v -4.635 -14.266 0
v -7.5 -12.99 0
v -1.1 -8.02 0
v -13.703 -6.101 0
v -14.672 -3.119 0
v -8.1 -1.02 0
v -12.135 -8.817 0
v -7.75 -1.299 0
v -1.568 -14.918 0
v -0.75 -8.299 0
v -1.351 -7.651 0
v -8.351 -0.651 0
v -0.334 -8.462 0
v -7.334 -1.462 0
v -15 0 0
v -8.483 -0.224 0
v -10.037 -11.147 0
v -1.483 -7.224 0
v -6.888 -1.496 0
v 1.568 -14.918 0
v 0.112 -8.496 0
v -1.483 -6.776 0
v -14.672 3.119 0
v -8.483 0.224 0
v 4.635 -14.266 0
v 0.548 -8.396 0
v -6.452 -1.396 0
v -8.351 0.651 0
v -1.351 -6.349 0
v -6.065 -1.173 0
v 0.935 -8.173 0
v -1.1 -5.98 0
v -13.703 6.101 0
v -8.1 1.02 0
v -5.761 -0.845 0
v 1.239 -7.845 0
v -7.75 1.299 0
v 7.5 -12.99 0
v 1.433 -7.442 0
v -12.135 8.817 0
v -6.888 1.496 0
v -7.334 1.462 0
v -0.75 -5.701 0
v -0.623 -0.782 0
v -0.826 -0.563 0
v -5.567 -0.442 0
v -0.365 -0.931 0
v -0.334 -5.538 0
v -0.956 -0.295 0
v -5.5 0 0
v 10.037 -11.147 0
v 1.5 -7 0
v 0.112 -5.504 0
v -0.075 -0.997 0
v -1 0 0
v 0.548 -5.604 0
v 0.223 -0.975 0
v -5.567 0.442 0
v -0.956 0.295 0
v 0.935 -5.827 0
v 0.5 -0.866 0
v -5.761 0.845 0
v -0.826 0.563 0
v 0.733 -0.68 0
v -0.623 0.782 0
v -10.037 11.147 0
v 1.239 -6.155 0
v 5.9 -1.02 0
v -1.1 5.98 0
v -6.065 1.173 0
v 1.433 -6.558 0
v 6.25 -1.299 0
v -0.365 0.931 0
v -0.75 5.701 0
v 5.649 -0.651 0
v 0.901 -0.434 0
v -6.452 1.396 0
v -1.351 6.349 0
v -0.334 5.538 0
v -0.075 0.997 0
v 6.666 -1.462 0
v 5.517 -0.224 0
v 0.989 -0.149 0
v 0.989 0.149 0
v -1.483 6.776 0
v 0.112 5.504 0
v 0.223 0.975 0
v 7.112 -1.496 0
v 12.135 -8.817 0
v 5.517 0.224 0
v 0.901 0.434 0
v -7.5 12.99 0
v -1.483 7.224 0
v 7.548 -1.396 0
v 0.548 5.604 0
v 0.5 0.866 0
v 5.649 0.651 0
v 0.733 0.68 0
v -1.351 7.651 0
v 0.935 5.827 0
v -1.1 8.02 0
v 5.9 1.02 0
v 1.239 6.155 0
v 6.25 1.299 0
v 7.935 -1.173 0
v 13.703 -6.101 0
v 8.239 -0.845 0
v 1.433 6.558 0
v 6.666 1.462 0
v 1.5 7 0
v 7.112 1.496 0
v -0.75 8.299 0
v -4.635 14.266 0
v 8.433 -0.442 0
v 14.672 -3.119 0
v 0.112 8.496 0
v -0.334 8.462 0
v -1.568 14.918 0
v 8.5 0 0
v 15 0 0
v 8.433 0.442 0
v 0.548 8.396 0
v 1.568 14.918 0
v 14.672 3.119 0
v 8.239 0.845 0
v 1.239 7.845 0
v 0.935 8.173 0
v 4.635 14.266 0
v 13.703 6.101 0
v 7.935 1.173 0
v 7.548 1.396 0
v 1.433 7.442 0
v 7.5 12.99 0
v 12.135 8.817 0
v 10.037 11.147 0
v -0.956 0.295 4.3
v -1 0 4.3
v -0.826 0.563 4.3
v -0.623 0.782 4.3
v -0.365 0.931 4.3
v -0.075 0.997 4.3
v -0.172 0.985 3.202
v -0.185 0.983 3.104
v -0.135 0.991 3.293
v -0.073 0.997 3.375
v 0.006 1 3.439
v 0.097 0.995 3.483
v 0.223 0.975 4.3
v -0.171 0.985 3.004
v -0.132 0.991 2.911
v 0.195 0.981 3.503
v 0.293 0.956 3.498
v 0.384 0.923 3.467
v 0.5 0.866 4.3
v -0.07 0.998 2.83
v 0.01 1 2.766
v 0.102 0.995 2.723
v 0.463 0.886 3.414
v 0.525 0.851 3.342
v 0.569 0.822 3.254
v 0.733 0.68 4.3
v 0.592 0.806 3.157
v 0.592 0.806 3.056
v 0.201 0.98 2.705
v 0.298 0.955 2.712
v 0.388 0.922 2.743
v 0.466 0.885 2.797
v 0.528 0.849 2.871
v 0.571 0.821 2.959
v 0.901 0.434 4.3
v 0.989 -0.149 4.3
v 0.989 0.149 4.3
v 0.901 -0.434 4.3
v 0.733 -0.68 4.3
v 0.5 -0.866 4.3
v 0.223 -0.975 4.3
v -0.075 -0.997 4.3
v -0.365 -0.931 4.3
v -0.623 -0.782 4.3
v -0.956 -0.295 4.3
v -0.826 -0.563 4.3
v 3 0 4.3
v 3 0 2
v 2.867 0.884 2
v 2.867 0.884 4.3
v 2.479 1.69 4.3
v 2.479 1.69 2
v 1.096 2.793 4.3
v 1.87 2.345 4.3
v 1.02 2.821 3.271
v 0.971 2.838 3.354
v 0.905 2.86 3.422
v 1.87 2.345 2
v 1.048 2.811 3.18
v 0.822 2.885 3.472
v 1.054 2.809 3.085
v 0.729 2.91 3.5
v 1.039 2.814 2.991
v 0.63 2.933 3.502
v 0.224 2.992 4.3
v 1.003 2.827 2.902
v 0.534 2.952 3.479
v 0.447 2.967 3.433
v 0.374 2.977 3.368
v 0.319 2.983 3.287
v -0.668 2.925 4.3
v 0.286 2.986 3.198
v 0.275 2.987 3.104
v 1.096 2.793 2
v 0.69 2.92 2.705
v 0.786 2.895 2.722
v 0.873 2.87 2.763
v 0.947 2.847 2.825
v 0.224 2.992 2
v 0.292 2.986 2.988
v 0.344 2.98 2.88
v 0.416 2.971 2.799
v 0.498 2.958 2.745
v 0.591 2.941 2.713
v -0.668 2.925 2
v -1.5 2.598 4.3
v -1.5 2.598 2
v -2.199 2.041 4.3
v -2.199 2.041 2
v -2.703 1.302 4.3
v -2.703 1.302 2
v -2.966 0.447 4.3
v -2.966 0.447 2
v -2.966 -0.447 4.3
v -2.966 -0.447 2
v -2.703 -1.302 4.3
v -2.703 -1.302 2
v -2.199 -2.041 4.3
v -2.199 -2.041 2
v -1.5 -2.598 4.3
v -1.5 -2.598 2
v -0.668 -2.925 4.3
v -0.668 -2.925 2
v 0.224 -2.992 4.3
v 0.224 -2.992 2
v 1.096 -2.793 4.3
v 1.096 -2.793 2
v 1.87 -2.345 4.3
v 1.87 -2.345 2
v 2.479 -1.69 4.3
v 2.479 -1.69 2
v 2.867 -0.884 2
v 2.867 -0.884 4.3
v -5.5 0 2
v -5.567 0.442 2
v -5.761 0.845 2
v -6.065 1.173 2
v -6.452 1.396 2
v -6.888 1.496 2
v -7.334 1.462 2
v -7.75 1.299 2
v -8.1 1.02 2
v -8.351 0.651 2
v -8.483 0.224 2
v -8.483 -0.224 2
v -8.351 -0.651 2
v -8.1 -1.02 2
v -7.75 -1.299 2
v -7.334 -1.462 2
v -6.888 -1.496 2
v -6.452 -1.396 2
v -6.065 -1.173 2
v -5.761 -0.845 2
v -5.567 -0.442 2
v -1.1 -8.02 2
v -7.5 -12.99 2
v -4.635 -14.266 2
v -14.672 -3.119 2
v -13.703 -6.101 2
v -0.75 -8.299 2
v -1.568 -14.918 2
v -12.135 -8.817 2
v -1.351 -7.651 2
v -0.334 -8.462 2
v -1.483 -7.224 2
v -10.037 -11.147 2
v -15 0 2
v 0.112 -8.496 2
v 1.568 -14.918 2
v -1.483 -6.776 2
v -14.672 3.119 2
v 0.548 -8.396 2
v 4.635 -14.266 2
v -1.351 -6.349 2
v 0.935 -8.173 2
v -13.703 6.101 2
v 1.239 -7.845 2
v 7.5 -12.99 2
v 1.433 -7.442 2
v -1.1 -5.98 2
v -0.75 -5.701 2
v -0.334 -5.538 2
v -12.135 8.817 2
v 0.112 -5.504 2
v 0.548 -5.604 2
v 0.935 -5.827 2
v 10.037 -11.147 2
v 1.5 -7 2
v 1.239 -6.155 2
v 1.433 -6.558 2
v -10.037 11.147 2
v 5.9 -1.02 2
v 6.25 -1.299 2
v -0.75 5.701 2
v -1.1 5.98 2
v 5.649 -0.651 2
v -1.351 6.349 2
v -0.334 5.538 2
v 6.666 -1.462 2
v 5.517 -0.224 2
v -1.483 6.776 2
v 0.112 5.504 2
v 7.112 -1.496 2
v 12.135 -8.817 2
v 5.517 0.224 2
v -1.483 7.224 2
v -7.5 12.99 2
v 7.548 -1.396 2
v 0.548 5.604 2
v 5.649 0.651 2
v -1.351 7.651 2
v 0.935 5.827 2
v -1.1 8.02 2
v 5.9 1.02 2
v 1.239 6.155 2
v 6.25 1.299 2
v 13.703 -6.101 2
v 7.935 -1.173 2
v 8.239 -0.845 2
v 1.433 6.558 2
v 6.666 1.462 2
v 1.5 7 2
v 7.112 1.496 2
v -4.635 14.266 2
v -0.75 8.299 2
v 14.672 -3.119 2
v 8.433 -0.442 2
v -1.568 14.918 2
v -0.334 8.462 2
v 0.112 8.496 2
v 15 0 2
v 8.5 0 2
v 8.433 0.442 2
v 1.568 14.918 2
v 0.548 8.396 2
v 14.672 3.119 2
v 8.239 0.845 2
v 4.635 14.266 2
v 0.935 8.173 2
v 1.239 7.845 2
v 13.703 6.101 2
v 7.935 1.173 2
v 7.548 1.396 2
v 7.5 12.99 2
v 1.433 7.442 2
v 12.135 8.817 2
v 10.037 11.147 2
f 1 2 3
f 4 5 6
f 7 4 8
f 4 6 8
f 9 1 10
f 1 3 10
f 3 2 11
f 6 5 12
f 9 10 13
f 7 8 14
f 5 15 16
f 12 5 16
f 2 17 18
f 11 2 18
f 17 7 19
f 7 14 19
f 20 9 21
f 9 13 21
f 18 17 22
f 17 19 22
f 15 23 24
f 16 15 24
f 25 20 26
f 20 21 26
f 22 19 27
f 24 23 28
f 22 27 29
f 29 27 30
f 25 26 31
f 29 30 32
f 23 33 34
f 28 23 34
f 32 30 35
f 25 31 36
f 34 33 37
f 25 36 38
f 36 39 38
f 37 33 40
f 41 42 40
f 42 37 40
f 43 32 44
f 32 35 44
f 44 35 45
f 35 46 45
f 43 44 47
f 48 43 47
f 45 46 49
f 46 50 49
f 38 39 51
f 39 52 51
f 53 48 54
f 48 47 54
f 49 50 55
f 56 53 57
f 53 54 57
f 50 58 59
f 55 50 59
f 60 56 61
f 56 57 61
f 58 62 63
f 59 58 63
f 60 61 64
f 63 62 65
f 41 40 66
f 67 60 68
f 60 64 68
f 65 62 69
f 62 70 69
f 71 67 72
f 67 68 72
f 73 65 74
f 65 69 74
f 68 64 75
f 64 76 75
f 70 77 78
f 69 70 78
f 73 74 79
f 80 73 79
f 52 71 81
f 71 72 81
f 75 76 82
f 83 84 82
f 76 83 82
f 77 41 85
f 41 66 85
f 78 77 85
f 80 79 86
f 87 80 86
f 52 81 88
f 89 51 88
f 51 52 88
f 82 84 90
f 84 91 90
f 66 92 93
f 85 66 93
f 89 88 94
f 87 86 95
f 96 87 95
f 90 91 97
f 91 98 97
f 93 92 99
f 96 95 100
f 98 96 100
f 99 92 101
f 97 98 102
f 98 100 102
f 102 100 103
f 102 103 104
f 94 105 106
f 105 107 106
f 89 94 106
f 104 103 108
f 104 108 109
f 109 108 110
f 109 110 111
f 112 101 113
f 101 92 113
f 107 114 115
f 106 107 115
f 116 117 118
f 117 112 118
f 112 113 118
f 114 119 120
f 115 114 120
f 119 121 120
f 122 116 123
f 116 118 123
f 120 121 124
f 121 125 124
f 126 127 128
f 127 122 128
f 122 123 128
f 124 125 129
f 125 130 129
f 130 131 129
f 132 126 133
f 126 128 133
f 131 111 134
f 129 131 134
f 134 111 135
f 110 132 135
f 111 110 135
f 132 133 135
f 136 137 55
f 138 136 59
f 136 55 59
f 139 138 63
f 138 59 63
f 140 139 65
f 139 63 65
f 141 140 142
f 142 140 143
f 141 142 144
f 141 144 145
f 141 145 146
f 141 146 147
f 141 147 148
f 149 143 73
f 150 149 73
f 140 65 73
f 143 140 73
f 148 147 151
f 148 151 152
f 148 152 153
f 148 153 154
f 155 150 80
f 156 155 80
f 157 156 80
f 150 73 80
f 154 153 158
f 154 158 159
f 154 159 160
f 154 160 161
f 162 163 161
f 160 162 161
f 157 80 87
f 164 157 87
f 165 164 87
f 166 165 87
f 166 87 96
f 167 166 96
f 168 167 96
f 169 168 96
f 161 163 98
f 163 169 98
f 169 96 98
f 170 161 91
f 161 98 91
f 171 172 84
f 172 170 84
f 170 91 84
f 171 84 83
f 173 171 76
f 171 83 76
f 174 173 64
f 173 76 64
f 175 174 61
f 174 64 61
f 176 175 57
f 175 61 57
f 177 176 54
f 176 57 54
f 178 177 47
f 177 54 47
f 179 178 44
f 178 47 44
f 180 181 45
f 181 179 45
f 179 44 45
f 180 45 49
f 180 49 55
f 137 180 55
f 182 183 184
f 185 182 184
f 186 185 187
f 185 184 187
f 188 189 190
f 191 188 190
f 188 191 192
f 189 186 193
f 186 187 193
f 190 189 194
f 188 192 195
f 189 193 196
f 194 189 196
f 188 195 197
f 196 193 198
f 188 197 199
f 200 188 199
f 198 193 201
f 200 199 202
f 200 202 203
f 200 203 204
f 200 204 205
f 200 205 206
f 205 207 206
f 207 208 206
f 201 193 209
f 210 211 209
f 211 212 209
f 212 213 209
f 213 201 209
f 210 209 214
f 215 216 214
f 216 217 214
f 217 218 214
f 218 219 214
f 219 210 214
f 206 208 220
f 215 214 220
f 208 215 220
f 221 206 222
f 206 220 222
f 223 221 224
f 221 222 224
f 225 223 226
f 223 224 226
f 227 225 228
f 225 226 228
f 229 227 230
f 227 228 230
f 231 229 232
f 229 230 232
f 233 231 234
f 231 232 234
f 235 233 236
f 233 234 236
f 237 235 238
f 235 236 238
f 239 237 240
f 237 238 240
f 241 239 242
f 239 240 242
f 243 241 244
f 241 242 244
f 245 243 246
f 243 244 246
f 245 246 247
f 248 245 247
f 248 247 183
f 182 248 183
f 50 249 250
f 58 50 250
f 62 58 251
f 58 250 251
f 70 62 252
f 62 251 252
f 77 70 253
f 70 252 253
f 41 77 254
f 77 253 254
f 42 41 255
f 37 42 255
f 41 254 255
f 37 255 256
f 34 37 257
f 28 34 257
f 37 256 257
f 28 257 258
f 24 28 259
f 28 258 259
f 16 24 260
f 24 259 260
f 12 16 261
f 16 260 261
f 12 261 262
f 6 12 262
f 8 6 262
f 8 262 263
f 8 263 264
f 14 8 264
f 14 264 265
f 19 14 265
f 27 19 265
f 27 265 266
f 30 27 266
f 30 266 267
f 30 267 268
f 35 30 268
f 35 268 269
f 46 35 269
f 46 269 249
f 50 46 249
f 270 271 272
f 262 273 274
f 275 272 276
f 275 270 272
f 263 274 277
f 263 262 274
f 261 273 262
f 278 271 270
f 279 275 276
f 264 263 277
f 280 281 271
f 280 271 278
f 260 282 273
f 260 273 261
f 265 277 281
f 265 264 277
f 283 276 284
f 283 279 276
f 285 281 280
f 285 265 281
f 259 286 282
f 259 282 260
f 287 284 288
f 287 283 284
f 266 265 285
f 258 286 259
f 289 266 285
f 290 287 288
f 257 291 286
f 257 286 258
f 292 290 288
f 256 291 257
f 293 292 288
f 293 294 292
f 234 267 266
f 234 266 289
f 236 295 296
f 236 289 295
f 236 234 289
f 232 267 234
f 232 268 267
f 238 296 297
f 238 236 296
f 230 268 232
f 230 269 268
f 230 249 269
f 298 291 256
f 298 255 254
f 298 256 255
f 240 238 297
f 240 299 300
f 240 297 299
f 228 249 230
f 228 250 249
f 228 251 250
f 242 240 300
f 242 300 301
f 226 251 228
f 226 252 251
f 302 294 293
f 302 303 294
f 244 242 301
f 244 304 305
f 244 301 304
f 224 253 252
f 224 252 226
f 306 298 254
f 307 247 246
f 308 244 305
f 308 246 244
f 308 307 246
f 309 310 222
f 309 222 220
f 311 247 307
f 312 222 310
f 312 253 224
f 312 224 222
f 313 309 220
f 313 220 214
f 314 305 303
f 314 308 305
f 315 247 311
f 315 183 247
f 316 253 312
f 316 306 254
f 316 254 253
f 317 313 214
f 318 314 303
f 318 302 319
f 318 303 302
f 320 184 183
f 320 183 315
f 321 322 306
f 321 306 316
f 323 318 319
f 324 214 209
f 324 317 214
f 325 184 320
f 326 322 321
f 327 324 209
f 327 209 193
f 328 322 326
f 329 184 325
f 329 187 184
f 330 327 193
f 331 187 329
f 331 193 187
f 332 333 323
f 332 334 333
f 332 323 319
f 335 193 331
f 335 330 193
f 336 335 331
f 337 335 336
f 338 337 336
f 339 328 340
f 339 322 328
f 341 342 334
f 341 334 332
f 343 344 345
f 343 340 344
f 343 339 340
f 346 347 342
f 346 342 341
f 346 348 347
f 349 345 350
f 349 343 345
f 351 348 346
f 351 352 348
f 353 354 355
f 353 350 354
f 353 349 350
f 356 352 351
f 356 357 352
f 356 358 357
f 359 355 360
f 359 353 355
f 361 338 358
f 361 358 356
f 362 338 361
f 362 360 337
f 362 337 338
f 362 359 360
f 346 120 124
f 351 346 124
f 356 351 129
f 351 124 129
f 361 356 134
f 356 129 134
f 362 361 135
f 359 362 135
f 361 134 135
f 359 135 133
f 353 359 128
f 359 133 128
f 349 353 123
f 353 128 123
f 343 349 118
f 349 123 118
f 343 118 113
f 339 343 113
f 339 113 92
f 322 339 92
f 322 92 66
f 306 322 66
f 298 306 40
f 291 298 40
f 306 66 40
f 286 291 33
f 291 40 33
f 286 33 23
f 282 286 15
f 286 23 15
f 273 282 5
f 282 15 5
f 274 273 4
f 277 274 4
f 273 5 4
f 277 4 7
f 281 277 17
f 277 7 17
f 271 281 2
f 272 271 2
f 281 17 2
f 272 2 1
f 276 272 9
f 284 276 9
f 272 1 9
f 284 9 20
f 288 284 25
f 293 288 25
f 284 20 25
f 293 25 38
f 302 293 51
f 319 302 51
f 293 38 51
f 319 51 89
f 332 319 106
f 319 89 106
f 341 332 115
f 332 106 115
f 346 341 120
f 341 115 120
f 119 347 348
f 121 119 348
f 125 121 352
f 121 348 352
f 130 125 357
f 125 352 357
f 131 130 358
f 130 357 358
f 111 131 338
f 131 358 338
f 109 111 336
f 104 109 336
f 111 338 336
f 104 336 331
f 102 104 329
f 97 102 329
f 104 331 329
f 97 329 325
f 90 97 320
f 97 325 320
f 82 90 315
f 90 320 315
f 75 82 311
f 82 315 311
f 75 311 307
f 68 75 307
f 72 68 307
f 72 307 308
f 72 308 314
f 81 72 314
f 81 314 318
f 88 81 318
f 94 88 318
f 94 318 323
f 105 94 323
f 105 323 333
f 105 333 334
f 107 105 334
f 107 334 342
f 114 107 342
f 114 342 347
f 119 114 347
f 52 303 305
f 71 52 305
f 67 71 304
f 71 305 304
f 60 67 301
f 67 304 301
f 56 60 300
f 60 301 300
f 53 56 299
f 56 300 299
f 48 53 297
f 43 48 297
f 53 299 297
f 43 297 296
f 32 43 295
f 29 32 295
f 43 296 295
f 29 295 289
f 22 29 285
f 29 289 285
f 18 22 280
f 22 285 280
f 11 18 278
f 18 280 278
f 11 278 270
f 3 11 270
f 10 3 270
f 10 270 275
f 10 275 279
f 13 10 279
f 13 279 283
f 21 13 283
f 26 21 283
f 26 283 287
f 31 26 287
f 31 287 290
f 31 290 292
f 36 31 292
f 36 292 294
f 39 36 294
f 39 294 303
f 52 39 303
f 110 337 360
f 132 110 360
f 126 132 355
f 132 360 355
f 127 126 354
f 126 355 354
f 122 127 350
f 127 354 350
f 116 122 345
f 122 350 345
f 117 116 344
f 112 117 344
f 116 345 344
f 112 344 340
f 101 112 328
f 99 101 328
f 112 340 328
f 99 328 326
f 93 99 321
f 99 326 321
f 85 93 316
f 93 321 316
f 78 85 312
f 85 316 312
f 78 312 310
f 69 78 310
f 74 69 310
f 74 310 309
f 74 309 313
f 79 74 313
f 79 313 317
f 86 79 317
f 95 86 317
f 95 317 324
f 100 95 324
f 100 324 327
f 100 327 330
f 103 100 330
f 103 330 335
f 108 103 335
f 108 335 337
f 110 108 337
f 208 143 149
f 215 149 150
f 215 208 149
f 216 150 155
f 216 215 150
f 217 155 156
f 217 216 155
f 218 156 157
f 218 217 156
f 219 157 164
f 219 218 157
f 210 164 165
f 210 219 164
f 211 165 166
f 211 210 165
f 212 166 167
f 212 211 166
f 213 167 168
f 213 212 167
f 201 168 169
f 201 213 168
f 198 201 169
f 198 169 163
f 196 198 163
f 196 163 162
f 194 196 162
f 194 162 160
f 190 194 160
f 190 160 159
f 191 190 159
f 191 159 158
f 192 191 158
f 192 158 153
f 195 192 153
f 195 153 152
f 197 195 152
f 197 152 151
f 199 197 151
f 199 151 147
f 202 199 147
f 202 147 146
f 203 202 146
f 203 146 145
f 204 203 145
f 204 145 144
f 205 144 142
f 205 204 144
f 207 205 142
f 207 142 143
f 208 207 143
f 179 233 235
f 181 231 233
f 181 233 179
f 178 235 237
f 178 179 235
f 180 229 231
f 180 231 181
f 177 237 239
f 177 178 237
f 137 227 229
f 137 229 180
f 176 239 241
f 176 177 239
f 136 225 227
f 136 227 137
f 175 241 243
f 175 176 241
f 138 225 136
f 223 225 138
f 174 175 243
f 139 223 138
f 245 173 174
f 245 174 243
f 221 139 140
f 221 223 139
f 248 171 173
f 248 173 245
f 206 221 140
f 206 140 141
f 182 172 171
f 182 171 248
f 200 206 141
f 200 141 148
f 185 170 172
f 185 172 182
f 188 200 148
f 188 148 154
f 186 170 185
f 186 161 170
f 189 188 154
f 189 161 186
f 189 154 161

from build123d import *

# Parameters (mm, degrees)
SKETCH_1_R               = 15
EXTRUDE_1_DEPTH          = 2
SKETCH_2_R               = 3
SKETCH_2_R_2             = 1
EXTRUDE_2_DEPTH          = 2.3
SKETCH_3_R               = 1
CUT_EXTRUDE_1_DEPTH      = 6
SKETCH_4_R               = 1
CUT_EXTRUDE_2_DEPTH      = 22.644629819
SKETCH_5_R               = 1.5
CUT_EXTRUDE_3_DEPTH      = 10
CUT_EXTRUDE_4_DEPTH      = 2
CUT_EXTRUDE_4_DEPTH_BACK = 1.1
SKETCH_6_R               = 0.4


with BuildPart() as part:
    # 草图1 → 凸台-拉伸1 (new body)
    with BuildSketch(Plane.XY):
        Circle(SKETCH_1_R)
    extrude(amount=EXTRUDE_1_DEPTH)

    # 草图2 → 凸台-拉伸2 (add)
    with BuildSketch(Plane.XY.offset(2)):
        Circle(SKETCH_2_R)
        Circle(SKETCH_2_R_2, mode=Mode.SUBTRACT)
    extrude(amount=EXTRUDE_2_DEPTH)

    # 草图3 → 切除-拉伸1 (cut)
    with BuildSketch(Plane.XY.offset(2)):
        with Locations((0, 7)):
            Circle(SKETCH_3_R)
        with Locations((7, 0)):
            Circle(SKETCH_3_R)
        with Locations((0, -7)):
            Circle(SKETCH_3_R)
        with Locations((-7, 0)):
            Circle(SKETCH_3_R)
    extrude(amount=-CUT_EXTRUDE_1_DEPTH, mode=Mode.SUBTRACT)

    # 草图4 → 切除-拉伸2 (cut, through all)
    with BuildSketch(Plane(origin=(0, 0, 0), x_dir=(-1, 0, 0), z_dir=(0, 0, -1))):
        Circle(SKETCH_4_R)
    extrude(amount=-CUT_EXTRUDE_2_DEPTH, mode=Mode.SUBTRACT)

    # 草图5 → 切除-拉伸3 (cut)
    with BuildSketch(Plane.XY.offset(2)):
        with Locations((0, 7)):
            Circle(SKETCH_5_R)
        with Locations((-7, 0)):
            Circle(SKETCH_5_R)
        with Locations((7, 0)):
            Circle(SKETCH_5_R)
        with Locations((0, -7)):
            Circle(SKETCH_5_R)
    extrude(amount=-CUT_EXTRUDE_3_DEPTH, mode=Mode.SUBTRACT)

    # 草图6 → 切除-拉伸4 (cut, two sides: drawn at the far end of the back side and taken through both)
    with BuildSketch(Plane(origin=(64.521548832, -12.754908116, 46.976284772), x_dir=(0, 0, -1), z_dir=(-0.22357508845081375, -0.9746867085500914, 1.0628725110972871e-14)).offset(-CUT_EXTRUDE_4_DEPTH_BACK)):
        with Locations(Location((43.872176256, -65.74, 0), (0, 0, 270))):
            Circle(SKETCH_6_R)
    extrude(amount=CUT_EXTRUDE_4_DEPTH + CUT_EXTRUDE_4_DEPTH_BACK, mode=Mode.SUBTRACT)


solid = part.part
